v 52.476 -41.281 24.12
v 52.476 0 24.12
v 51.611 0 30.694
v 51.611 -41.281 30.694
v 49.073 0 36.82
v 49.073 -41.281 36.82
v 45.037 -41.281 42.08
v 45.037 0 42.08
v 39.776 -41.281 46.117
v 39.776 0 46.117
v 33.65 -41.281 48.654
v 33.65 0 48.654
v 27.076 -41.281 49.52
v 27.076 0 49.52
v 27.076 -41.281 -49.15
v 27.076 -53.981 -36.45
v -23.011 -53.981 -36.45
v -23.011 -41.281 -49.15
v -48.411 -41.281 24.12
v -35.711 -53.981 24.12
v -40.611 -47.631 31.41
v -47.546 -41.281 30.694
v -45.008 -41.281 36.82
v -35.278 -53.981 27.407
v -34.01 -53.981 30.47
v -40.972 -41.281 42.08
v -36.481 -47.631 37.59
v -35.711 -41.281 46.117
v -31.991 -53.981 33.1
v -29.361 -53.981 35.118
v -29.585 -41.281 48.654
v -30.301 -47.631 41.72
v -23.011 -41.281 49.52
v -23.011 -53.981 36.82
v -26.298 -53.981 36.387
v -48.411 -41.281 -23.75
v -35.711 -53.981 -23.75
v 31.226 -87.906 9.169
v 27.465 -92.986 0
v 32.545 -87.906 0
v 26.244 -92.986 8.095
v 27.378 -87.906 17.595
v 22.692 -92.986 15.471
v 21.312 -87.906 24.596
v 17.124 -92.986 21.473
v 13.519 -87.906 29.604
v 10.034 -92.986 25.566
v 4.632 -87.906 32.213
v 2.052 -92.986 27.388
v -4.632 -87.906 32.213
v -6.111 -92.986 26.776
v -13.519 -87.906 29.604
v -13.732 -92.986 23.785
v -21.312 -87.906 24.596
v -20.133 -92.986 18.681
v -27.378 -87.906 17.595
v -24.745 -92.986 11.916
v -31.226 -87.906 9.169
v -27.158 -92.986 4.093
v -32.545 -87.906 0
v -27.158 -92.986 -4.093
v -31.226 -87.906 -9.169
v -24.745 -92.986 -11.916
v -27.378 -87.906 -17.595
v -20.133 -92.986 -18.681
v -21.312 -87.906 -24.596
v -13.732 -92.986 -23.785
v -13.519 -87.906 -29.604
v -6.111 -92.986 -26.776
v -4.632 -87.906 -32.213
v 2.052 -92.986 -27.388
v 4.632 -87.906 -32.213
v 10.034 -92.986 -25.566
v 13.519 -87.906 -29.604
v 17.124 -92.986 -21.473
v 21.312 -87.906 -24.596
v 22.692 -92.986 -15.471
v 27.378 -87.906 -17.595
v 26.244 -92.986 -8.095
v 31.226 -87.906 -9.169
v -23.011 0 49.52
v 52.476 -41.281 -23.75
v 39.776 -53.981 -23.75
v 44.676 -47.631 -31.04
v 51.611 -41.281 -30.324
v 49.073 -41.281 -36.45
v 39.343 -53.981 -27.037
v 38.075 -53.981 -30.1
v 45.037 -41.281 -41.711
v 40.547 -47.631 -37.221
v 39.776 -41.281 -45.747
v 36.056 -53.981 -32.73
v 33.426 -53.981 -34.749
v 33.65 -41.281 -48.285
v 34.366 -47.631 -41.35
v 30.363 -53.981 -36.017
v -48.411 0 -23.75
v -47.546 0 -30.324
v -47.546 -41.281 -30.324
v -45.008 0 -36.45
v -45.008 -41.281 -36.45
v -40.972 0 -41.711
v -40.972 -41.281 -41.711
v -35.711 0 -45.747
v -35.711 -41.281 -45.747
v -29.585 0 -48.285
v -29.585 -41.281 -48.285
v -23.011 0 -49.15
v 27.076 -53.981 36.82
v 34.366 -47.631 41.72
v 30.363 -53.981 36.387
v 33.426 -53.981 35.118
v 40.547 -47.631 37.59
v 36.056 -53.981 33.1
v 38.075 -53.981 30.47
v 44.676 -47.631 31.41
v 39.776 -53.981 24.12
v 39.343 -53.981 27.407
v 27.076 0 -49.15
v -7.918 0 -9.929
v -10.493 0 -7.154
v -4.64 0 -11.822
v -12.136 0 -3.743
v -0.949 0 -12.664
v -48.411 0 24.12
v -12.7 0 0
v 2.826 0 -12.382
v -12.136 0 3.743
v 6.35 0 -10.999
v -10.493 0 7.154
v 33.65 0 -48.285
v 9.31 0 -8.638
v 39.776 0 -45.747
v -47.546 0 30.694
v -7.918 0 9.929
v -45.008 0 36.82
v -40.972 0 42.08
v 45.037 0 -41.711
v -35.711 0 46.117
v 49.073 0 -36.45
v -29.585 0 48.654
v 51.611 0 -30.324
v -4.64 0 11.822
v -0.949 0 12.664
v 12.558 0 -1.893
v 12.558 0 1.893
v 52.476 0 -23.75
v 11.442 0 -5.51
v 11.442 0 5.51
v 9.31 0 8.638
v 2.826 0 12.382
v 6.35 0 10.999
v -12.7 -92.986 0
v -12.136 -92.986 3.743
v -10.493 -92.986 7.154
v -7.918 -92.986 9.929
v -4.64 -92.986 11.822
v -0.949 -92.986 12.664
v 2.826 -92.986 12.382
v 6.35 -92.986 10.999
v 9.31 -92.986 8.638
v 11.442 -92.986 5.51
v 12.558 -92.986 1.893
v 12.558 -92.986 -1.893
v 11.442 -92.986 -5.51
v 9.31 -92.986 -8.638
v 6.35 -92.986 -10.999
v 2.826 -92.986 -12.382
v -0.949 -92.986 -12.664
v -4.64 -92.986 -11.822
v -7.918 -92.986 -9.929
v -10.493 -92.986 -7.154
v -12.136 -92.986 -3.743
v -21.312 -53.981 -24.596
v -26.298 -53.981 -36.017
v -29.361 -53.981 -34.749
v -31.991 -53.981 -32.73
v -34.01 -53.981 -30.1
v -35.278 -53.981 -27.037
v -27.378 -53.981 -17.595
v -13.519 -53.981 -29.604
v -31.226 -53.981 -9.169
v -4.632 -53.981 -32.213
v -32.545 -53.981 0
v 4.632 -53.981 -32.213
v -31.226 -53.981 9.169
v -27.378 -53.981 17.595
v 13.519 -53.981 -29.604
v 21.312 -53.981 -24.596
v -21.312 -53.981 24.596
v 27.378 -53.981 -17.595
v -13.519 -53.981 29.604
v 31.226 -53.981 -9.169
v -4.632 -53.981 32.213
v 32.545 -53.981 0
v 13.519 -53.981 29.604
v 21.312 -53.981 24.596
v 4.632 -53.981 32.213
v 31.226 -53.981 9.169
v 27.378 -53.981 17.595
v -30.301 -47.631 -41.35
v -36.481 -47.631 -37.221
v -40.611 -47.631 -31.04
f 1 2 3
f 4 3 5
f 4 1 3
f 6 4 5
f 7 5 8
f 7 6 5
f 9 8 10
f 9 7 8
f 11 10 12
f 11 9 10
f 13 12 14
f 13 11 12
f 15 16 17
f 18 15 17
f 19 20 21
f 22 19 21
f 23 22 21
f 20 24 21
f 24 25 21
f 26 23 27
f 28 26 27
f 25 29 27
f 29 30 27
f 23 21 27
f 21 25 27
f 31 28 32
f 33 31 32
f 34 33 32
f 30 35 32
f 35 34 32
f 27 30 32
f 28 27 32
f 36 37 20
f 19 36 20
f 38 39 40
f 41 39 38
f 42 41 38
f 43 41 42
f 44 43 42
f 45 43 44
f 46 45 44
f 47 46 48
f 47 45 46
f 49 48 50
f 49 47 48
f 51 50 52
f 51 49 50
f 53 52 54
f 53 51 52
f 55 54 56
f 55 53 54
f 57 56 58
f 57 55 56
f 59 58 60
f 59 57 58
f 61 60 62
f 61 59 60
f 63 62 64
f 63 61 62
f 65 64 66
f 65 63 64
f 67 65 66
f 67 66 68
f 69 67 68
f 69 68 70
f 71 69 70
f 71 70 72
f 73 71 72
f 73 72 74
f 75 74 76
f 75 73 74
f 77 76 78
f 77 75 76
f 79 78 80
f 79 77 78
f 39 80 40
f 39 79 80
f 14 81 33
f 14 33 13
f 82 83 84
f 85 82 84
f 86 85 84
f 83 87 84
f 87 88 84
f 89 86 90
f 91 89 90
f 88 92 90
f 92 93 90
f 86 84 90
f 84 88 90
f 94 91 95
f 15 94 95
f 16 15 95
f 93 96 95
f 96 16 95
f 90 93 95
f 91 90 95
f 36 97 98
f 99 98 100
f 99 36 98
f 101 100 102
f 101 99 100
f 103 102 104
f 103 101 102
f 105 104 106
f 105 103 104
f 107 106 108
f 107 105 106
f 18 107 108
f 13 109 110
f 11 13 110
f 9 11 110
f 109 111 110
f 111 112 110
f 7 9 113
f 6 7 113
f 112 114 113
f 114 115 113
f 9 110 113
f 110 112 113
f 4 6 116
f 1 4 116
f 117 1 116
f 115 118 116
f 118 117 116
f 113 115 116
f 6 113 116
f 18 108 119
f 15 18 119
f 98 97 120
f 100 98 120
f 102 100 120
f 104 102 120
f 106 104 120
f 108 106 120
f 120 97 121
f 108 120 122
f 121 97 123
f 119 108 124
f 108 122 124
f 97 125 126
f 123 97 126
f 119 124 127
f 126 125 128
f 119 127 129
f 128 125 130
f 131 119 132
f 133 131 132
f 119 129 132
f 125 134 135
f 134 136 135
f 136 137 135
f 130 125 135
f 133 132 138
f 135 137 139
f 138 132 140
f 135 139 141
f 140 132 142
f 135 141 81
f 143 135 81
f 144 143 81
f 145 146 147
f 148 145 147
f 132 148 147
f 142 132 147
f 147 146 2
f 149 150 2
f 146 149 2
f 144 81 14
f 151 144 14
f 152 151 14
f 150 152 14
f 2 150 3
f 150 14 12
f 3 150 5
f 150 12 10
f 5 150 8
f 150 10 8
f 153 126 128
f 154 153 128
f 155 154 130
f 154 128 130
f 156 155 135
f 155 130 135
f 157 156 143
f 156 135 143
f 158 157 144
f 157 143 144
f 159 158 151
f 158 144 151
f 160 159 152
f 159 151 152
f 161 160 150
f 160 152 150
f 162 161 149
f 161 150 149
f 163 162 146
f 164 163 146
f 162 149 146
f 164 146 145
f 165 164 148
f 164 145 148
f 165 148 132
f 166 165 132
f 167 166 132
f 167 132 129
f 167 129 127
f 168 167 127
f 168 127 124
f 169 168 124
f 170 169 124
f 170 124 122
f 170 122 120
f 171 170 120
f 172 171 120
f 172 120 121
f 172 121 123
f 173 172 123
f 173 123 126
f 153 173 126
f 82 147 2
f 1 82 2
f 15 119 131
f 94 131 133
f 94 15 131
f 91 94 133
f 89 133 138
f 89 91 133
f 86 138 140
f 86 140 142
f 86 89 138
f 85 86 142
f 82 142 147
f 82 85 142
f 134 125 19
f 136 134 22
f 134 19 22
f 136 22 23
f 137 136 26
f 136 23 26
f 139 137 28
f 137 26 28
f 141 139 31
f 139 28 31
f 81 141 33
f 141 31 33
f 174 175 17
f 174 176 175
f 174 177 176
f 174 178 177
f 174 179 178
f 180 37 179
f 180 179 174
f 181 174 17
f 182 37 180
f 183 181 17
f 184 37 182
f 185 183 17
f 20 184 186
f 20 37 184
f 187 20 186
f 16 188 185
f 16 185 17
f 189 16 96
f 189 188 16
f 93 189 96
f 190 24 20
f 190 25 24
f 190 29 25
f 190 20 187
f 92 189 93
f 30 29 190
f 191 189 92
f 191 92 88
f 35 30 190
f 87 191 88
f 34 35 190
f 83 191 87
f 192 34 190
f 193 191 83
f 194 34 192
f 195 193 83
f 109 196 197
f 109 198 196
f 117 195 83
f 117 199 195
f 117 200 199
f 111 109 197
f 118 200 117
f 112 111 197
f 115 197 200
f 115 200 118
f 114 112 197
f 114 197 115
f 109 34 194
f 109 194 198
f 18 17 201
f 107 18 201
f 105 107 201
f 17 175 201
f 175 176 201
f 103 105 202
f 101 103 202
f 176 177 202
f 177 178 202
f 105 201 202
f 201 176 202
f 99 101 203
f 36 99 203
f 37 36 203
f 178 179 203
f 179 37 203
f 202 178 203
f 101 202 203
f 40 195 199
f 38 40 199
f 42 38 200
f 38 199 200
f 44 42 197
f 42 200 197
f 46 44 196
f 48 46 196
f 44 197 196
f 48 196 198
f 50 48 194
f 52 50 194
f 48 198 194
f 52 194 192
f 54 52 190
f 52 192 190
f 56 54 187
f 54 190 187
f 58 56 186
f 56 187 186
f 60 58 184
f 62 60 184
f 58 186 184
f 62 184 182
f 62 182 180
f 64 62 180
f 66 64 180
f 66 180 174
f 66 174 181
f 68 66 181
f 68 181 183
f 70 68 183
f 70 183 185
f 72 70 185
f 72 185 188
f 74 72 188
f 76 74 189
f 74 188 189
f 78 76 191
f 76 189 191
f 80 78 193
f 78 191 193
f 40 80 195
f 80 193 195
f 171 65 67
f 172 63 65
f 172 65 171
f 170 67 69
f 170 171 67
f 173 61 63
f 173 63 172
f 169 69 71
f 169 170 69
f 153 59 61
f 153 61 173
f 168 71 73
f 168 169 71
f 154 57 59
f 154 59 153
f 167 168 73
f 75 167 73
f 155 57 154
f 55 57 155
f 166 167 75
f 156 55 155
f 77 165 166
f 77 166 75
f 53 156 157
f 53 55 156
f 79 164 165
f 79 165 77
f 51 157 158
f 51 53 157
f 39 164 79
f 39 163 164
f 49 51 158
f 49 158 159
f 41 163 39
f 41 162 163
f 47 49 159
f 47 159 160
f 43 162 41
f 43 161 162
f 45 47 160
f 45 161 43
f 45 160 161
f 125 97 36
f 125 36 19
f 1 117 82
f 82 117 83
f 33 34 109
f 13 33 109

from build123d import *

# Parameters (mm, degrees)
F0_W     = 100.887247
F0_H     = 98.669946
F1_DEPTH = 53.981356
F2_R     = 25.4
F3_R     = 32.544511
F4_DEPTH = 39.004393
F6_D     = 25.4
F7_SIZE  = 12.7
F8_SIZE  = 5.08


with BuildPart() as f1:
    # F0 (on Front) → F1 (new body)
    with BuildSketch(Plane.XZ):
        with Locations((2.032529, 0.184774)):
            Rectangle(F0_W, F0_H)
    extrude(amount=F1_DEPTH)

    # F2
    f2_edges = [f1.edges().sort_by_distance(p)[0] for p in [
        (52.476153, -26.990678, 49.519747),
        (52.476153, -26.990678, -49.150199),
        (-48.411094, -26.990678, -49.150199),
        (-48.411094, -26.990678, 49.519747),
    ]]
    fillet(f2_edges, radius=F2_R)

    # F3 (on face) → F4 (join)
    with BuildSketch(Plane.XZ.offset(53.981356)):
        Circle(F3_R)
    extrude(amount=F4_DEPTH)

    # F6 (through all)
    with Locations(Plane.XZ.offset(92.985749)):
        with Locations((0, 0)):
            Hole(F6_D / 2)

    # F7
    f7_edges = [f1.edges().sort_by_distance(p)[0] for p in [
        (-48.411094, -53.981356, 0.184774),
    ]]
    chamfer(f7_edges, length=F7_SIZE)

    # F8
    f8_edges = [f1.edges().sort_by_distance(p)[0] for p in [
        (-32.544511, -92.985749, 0),
    ]]
    chamfer(f8_edges, length=F8_SIZE)


solid = f1.part
